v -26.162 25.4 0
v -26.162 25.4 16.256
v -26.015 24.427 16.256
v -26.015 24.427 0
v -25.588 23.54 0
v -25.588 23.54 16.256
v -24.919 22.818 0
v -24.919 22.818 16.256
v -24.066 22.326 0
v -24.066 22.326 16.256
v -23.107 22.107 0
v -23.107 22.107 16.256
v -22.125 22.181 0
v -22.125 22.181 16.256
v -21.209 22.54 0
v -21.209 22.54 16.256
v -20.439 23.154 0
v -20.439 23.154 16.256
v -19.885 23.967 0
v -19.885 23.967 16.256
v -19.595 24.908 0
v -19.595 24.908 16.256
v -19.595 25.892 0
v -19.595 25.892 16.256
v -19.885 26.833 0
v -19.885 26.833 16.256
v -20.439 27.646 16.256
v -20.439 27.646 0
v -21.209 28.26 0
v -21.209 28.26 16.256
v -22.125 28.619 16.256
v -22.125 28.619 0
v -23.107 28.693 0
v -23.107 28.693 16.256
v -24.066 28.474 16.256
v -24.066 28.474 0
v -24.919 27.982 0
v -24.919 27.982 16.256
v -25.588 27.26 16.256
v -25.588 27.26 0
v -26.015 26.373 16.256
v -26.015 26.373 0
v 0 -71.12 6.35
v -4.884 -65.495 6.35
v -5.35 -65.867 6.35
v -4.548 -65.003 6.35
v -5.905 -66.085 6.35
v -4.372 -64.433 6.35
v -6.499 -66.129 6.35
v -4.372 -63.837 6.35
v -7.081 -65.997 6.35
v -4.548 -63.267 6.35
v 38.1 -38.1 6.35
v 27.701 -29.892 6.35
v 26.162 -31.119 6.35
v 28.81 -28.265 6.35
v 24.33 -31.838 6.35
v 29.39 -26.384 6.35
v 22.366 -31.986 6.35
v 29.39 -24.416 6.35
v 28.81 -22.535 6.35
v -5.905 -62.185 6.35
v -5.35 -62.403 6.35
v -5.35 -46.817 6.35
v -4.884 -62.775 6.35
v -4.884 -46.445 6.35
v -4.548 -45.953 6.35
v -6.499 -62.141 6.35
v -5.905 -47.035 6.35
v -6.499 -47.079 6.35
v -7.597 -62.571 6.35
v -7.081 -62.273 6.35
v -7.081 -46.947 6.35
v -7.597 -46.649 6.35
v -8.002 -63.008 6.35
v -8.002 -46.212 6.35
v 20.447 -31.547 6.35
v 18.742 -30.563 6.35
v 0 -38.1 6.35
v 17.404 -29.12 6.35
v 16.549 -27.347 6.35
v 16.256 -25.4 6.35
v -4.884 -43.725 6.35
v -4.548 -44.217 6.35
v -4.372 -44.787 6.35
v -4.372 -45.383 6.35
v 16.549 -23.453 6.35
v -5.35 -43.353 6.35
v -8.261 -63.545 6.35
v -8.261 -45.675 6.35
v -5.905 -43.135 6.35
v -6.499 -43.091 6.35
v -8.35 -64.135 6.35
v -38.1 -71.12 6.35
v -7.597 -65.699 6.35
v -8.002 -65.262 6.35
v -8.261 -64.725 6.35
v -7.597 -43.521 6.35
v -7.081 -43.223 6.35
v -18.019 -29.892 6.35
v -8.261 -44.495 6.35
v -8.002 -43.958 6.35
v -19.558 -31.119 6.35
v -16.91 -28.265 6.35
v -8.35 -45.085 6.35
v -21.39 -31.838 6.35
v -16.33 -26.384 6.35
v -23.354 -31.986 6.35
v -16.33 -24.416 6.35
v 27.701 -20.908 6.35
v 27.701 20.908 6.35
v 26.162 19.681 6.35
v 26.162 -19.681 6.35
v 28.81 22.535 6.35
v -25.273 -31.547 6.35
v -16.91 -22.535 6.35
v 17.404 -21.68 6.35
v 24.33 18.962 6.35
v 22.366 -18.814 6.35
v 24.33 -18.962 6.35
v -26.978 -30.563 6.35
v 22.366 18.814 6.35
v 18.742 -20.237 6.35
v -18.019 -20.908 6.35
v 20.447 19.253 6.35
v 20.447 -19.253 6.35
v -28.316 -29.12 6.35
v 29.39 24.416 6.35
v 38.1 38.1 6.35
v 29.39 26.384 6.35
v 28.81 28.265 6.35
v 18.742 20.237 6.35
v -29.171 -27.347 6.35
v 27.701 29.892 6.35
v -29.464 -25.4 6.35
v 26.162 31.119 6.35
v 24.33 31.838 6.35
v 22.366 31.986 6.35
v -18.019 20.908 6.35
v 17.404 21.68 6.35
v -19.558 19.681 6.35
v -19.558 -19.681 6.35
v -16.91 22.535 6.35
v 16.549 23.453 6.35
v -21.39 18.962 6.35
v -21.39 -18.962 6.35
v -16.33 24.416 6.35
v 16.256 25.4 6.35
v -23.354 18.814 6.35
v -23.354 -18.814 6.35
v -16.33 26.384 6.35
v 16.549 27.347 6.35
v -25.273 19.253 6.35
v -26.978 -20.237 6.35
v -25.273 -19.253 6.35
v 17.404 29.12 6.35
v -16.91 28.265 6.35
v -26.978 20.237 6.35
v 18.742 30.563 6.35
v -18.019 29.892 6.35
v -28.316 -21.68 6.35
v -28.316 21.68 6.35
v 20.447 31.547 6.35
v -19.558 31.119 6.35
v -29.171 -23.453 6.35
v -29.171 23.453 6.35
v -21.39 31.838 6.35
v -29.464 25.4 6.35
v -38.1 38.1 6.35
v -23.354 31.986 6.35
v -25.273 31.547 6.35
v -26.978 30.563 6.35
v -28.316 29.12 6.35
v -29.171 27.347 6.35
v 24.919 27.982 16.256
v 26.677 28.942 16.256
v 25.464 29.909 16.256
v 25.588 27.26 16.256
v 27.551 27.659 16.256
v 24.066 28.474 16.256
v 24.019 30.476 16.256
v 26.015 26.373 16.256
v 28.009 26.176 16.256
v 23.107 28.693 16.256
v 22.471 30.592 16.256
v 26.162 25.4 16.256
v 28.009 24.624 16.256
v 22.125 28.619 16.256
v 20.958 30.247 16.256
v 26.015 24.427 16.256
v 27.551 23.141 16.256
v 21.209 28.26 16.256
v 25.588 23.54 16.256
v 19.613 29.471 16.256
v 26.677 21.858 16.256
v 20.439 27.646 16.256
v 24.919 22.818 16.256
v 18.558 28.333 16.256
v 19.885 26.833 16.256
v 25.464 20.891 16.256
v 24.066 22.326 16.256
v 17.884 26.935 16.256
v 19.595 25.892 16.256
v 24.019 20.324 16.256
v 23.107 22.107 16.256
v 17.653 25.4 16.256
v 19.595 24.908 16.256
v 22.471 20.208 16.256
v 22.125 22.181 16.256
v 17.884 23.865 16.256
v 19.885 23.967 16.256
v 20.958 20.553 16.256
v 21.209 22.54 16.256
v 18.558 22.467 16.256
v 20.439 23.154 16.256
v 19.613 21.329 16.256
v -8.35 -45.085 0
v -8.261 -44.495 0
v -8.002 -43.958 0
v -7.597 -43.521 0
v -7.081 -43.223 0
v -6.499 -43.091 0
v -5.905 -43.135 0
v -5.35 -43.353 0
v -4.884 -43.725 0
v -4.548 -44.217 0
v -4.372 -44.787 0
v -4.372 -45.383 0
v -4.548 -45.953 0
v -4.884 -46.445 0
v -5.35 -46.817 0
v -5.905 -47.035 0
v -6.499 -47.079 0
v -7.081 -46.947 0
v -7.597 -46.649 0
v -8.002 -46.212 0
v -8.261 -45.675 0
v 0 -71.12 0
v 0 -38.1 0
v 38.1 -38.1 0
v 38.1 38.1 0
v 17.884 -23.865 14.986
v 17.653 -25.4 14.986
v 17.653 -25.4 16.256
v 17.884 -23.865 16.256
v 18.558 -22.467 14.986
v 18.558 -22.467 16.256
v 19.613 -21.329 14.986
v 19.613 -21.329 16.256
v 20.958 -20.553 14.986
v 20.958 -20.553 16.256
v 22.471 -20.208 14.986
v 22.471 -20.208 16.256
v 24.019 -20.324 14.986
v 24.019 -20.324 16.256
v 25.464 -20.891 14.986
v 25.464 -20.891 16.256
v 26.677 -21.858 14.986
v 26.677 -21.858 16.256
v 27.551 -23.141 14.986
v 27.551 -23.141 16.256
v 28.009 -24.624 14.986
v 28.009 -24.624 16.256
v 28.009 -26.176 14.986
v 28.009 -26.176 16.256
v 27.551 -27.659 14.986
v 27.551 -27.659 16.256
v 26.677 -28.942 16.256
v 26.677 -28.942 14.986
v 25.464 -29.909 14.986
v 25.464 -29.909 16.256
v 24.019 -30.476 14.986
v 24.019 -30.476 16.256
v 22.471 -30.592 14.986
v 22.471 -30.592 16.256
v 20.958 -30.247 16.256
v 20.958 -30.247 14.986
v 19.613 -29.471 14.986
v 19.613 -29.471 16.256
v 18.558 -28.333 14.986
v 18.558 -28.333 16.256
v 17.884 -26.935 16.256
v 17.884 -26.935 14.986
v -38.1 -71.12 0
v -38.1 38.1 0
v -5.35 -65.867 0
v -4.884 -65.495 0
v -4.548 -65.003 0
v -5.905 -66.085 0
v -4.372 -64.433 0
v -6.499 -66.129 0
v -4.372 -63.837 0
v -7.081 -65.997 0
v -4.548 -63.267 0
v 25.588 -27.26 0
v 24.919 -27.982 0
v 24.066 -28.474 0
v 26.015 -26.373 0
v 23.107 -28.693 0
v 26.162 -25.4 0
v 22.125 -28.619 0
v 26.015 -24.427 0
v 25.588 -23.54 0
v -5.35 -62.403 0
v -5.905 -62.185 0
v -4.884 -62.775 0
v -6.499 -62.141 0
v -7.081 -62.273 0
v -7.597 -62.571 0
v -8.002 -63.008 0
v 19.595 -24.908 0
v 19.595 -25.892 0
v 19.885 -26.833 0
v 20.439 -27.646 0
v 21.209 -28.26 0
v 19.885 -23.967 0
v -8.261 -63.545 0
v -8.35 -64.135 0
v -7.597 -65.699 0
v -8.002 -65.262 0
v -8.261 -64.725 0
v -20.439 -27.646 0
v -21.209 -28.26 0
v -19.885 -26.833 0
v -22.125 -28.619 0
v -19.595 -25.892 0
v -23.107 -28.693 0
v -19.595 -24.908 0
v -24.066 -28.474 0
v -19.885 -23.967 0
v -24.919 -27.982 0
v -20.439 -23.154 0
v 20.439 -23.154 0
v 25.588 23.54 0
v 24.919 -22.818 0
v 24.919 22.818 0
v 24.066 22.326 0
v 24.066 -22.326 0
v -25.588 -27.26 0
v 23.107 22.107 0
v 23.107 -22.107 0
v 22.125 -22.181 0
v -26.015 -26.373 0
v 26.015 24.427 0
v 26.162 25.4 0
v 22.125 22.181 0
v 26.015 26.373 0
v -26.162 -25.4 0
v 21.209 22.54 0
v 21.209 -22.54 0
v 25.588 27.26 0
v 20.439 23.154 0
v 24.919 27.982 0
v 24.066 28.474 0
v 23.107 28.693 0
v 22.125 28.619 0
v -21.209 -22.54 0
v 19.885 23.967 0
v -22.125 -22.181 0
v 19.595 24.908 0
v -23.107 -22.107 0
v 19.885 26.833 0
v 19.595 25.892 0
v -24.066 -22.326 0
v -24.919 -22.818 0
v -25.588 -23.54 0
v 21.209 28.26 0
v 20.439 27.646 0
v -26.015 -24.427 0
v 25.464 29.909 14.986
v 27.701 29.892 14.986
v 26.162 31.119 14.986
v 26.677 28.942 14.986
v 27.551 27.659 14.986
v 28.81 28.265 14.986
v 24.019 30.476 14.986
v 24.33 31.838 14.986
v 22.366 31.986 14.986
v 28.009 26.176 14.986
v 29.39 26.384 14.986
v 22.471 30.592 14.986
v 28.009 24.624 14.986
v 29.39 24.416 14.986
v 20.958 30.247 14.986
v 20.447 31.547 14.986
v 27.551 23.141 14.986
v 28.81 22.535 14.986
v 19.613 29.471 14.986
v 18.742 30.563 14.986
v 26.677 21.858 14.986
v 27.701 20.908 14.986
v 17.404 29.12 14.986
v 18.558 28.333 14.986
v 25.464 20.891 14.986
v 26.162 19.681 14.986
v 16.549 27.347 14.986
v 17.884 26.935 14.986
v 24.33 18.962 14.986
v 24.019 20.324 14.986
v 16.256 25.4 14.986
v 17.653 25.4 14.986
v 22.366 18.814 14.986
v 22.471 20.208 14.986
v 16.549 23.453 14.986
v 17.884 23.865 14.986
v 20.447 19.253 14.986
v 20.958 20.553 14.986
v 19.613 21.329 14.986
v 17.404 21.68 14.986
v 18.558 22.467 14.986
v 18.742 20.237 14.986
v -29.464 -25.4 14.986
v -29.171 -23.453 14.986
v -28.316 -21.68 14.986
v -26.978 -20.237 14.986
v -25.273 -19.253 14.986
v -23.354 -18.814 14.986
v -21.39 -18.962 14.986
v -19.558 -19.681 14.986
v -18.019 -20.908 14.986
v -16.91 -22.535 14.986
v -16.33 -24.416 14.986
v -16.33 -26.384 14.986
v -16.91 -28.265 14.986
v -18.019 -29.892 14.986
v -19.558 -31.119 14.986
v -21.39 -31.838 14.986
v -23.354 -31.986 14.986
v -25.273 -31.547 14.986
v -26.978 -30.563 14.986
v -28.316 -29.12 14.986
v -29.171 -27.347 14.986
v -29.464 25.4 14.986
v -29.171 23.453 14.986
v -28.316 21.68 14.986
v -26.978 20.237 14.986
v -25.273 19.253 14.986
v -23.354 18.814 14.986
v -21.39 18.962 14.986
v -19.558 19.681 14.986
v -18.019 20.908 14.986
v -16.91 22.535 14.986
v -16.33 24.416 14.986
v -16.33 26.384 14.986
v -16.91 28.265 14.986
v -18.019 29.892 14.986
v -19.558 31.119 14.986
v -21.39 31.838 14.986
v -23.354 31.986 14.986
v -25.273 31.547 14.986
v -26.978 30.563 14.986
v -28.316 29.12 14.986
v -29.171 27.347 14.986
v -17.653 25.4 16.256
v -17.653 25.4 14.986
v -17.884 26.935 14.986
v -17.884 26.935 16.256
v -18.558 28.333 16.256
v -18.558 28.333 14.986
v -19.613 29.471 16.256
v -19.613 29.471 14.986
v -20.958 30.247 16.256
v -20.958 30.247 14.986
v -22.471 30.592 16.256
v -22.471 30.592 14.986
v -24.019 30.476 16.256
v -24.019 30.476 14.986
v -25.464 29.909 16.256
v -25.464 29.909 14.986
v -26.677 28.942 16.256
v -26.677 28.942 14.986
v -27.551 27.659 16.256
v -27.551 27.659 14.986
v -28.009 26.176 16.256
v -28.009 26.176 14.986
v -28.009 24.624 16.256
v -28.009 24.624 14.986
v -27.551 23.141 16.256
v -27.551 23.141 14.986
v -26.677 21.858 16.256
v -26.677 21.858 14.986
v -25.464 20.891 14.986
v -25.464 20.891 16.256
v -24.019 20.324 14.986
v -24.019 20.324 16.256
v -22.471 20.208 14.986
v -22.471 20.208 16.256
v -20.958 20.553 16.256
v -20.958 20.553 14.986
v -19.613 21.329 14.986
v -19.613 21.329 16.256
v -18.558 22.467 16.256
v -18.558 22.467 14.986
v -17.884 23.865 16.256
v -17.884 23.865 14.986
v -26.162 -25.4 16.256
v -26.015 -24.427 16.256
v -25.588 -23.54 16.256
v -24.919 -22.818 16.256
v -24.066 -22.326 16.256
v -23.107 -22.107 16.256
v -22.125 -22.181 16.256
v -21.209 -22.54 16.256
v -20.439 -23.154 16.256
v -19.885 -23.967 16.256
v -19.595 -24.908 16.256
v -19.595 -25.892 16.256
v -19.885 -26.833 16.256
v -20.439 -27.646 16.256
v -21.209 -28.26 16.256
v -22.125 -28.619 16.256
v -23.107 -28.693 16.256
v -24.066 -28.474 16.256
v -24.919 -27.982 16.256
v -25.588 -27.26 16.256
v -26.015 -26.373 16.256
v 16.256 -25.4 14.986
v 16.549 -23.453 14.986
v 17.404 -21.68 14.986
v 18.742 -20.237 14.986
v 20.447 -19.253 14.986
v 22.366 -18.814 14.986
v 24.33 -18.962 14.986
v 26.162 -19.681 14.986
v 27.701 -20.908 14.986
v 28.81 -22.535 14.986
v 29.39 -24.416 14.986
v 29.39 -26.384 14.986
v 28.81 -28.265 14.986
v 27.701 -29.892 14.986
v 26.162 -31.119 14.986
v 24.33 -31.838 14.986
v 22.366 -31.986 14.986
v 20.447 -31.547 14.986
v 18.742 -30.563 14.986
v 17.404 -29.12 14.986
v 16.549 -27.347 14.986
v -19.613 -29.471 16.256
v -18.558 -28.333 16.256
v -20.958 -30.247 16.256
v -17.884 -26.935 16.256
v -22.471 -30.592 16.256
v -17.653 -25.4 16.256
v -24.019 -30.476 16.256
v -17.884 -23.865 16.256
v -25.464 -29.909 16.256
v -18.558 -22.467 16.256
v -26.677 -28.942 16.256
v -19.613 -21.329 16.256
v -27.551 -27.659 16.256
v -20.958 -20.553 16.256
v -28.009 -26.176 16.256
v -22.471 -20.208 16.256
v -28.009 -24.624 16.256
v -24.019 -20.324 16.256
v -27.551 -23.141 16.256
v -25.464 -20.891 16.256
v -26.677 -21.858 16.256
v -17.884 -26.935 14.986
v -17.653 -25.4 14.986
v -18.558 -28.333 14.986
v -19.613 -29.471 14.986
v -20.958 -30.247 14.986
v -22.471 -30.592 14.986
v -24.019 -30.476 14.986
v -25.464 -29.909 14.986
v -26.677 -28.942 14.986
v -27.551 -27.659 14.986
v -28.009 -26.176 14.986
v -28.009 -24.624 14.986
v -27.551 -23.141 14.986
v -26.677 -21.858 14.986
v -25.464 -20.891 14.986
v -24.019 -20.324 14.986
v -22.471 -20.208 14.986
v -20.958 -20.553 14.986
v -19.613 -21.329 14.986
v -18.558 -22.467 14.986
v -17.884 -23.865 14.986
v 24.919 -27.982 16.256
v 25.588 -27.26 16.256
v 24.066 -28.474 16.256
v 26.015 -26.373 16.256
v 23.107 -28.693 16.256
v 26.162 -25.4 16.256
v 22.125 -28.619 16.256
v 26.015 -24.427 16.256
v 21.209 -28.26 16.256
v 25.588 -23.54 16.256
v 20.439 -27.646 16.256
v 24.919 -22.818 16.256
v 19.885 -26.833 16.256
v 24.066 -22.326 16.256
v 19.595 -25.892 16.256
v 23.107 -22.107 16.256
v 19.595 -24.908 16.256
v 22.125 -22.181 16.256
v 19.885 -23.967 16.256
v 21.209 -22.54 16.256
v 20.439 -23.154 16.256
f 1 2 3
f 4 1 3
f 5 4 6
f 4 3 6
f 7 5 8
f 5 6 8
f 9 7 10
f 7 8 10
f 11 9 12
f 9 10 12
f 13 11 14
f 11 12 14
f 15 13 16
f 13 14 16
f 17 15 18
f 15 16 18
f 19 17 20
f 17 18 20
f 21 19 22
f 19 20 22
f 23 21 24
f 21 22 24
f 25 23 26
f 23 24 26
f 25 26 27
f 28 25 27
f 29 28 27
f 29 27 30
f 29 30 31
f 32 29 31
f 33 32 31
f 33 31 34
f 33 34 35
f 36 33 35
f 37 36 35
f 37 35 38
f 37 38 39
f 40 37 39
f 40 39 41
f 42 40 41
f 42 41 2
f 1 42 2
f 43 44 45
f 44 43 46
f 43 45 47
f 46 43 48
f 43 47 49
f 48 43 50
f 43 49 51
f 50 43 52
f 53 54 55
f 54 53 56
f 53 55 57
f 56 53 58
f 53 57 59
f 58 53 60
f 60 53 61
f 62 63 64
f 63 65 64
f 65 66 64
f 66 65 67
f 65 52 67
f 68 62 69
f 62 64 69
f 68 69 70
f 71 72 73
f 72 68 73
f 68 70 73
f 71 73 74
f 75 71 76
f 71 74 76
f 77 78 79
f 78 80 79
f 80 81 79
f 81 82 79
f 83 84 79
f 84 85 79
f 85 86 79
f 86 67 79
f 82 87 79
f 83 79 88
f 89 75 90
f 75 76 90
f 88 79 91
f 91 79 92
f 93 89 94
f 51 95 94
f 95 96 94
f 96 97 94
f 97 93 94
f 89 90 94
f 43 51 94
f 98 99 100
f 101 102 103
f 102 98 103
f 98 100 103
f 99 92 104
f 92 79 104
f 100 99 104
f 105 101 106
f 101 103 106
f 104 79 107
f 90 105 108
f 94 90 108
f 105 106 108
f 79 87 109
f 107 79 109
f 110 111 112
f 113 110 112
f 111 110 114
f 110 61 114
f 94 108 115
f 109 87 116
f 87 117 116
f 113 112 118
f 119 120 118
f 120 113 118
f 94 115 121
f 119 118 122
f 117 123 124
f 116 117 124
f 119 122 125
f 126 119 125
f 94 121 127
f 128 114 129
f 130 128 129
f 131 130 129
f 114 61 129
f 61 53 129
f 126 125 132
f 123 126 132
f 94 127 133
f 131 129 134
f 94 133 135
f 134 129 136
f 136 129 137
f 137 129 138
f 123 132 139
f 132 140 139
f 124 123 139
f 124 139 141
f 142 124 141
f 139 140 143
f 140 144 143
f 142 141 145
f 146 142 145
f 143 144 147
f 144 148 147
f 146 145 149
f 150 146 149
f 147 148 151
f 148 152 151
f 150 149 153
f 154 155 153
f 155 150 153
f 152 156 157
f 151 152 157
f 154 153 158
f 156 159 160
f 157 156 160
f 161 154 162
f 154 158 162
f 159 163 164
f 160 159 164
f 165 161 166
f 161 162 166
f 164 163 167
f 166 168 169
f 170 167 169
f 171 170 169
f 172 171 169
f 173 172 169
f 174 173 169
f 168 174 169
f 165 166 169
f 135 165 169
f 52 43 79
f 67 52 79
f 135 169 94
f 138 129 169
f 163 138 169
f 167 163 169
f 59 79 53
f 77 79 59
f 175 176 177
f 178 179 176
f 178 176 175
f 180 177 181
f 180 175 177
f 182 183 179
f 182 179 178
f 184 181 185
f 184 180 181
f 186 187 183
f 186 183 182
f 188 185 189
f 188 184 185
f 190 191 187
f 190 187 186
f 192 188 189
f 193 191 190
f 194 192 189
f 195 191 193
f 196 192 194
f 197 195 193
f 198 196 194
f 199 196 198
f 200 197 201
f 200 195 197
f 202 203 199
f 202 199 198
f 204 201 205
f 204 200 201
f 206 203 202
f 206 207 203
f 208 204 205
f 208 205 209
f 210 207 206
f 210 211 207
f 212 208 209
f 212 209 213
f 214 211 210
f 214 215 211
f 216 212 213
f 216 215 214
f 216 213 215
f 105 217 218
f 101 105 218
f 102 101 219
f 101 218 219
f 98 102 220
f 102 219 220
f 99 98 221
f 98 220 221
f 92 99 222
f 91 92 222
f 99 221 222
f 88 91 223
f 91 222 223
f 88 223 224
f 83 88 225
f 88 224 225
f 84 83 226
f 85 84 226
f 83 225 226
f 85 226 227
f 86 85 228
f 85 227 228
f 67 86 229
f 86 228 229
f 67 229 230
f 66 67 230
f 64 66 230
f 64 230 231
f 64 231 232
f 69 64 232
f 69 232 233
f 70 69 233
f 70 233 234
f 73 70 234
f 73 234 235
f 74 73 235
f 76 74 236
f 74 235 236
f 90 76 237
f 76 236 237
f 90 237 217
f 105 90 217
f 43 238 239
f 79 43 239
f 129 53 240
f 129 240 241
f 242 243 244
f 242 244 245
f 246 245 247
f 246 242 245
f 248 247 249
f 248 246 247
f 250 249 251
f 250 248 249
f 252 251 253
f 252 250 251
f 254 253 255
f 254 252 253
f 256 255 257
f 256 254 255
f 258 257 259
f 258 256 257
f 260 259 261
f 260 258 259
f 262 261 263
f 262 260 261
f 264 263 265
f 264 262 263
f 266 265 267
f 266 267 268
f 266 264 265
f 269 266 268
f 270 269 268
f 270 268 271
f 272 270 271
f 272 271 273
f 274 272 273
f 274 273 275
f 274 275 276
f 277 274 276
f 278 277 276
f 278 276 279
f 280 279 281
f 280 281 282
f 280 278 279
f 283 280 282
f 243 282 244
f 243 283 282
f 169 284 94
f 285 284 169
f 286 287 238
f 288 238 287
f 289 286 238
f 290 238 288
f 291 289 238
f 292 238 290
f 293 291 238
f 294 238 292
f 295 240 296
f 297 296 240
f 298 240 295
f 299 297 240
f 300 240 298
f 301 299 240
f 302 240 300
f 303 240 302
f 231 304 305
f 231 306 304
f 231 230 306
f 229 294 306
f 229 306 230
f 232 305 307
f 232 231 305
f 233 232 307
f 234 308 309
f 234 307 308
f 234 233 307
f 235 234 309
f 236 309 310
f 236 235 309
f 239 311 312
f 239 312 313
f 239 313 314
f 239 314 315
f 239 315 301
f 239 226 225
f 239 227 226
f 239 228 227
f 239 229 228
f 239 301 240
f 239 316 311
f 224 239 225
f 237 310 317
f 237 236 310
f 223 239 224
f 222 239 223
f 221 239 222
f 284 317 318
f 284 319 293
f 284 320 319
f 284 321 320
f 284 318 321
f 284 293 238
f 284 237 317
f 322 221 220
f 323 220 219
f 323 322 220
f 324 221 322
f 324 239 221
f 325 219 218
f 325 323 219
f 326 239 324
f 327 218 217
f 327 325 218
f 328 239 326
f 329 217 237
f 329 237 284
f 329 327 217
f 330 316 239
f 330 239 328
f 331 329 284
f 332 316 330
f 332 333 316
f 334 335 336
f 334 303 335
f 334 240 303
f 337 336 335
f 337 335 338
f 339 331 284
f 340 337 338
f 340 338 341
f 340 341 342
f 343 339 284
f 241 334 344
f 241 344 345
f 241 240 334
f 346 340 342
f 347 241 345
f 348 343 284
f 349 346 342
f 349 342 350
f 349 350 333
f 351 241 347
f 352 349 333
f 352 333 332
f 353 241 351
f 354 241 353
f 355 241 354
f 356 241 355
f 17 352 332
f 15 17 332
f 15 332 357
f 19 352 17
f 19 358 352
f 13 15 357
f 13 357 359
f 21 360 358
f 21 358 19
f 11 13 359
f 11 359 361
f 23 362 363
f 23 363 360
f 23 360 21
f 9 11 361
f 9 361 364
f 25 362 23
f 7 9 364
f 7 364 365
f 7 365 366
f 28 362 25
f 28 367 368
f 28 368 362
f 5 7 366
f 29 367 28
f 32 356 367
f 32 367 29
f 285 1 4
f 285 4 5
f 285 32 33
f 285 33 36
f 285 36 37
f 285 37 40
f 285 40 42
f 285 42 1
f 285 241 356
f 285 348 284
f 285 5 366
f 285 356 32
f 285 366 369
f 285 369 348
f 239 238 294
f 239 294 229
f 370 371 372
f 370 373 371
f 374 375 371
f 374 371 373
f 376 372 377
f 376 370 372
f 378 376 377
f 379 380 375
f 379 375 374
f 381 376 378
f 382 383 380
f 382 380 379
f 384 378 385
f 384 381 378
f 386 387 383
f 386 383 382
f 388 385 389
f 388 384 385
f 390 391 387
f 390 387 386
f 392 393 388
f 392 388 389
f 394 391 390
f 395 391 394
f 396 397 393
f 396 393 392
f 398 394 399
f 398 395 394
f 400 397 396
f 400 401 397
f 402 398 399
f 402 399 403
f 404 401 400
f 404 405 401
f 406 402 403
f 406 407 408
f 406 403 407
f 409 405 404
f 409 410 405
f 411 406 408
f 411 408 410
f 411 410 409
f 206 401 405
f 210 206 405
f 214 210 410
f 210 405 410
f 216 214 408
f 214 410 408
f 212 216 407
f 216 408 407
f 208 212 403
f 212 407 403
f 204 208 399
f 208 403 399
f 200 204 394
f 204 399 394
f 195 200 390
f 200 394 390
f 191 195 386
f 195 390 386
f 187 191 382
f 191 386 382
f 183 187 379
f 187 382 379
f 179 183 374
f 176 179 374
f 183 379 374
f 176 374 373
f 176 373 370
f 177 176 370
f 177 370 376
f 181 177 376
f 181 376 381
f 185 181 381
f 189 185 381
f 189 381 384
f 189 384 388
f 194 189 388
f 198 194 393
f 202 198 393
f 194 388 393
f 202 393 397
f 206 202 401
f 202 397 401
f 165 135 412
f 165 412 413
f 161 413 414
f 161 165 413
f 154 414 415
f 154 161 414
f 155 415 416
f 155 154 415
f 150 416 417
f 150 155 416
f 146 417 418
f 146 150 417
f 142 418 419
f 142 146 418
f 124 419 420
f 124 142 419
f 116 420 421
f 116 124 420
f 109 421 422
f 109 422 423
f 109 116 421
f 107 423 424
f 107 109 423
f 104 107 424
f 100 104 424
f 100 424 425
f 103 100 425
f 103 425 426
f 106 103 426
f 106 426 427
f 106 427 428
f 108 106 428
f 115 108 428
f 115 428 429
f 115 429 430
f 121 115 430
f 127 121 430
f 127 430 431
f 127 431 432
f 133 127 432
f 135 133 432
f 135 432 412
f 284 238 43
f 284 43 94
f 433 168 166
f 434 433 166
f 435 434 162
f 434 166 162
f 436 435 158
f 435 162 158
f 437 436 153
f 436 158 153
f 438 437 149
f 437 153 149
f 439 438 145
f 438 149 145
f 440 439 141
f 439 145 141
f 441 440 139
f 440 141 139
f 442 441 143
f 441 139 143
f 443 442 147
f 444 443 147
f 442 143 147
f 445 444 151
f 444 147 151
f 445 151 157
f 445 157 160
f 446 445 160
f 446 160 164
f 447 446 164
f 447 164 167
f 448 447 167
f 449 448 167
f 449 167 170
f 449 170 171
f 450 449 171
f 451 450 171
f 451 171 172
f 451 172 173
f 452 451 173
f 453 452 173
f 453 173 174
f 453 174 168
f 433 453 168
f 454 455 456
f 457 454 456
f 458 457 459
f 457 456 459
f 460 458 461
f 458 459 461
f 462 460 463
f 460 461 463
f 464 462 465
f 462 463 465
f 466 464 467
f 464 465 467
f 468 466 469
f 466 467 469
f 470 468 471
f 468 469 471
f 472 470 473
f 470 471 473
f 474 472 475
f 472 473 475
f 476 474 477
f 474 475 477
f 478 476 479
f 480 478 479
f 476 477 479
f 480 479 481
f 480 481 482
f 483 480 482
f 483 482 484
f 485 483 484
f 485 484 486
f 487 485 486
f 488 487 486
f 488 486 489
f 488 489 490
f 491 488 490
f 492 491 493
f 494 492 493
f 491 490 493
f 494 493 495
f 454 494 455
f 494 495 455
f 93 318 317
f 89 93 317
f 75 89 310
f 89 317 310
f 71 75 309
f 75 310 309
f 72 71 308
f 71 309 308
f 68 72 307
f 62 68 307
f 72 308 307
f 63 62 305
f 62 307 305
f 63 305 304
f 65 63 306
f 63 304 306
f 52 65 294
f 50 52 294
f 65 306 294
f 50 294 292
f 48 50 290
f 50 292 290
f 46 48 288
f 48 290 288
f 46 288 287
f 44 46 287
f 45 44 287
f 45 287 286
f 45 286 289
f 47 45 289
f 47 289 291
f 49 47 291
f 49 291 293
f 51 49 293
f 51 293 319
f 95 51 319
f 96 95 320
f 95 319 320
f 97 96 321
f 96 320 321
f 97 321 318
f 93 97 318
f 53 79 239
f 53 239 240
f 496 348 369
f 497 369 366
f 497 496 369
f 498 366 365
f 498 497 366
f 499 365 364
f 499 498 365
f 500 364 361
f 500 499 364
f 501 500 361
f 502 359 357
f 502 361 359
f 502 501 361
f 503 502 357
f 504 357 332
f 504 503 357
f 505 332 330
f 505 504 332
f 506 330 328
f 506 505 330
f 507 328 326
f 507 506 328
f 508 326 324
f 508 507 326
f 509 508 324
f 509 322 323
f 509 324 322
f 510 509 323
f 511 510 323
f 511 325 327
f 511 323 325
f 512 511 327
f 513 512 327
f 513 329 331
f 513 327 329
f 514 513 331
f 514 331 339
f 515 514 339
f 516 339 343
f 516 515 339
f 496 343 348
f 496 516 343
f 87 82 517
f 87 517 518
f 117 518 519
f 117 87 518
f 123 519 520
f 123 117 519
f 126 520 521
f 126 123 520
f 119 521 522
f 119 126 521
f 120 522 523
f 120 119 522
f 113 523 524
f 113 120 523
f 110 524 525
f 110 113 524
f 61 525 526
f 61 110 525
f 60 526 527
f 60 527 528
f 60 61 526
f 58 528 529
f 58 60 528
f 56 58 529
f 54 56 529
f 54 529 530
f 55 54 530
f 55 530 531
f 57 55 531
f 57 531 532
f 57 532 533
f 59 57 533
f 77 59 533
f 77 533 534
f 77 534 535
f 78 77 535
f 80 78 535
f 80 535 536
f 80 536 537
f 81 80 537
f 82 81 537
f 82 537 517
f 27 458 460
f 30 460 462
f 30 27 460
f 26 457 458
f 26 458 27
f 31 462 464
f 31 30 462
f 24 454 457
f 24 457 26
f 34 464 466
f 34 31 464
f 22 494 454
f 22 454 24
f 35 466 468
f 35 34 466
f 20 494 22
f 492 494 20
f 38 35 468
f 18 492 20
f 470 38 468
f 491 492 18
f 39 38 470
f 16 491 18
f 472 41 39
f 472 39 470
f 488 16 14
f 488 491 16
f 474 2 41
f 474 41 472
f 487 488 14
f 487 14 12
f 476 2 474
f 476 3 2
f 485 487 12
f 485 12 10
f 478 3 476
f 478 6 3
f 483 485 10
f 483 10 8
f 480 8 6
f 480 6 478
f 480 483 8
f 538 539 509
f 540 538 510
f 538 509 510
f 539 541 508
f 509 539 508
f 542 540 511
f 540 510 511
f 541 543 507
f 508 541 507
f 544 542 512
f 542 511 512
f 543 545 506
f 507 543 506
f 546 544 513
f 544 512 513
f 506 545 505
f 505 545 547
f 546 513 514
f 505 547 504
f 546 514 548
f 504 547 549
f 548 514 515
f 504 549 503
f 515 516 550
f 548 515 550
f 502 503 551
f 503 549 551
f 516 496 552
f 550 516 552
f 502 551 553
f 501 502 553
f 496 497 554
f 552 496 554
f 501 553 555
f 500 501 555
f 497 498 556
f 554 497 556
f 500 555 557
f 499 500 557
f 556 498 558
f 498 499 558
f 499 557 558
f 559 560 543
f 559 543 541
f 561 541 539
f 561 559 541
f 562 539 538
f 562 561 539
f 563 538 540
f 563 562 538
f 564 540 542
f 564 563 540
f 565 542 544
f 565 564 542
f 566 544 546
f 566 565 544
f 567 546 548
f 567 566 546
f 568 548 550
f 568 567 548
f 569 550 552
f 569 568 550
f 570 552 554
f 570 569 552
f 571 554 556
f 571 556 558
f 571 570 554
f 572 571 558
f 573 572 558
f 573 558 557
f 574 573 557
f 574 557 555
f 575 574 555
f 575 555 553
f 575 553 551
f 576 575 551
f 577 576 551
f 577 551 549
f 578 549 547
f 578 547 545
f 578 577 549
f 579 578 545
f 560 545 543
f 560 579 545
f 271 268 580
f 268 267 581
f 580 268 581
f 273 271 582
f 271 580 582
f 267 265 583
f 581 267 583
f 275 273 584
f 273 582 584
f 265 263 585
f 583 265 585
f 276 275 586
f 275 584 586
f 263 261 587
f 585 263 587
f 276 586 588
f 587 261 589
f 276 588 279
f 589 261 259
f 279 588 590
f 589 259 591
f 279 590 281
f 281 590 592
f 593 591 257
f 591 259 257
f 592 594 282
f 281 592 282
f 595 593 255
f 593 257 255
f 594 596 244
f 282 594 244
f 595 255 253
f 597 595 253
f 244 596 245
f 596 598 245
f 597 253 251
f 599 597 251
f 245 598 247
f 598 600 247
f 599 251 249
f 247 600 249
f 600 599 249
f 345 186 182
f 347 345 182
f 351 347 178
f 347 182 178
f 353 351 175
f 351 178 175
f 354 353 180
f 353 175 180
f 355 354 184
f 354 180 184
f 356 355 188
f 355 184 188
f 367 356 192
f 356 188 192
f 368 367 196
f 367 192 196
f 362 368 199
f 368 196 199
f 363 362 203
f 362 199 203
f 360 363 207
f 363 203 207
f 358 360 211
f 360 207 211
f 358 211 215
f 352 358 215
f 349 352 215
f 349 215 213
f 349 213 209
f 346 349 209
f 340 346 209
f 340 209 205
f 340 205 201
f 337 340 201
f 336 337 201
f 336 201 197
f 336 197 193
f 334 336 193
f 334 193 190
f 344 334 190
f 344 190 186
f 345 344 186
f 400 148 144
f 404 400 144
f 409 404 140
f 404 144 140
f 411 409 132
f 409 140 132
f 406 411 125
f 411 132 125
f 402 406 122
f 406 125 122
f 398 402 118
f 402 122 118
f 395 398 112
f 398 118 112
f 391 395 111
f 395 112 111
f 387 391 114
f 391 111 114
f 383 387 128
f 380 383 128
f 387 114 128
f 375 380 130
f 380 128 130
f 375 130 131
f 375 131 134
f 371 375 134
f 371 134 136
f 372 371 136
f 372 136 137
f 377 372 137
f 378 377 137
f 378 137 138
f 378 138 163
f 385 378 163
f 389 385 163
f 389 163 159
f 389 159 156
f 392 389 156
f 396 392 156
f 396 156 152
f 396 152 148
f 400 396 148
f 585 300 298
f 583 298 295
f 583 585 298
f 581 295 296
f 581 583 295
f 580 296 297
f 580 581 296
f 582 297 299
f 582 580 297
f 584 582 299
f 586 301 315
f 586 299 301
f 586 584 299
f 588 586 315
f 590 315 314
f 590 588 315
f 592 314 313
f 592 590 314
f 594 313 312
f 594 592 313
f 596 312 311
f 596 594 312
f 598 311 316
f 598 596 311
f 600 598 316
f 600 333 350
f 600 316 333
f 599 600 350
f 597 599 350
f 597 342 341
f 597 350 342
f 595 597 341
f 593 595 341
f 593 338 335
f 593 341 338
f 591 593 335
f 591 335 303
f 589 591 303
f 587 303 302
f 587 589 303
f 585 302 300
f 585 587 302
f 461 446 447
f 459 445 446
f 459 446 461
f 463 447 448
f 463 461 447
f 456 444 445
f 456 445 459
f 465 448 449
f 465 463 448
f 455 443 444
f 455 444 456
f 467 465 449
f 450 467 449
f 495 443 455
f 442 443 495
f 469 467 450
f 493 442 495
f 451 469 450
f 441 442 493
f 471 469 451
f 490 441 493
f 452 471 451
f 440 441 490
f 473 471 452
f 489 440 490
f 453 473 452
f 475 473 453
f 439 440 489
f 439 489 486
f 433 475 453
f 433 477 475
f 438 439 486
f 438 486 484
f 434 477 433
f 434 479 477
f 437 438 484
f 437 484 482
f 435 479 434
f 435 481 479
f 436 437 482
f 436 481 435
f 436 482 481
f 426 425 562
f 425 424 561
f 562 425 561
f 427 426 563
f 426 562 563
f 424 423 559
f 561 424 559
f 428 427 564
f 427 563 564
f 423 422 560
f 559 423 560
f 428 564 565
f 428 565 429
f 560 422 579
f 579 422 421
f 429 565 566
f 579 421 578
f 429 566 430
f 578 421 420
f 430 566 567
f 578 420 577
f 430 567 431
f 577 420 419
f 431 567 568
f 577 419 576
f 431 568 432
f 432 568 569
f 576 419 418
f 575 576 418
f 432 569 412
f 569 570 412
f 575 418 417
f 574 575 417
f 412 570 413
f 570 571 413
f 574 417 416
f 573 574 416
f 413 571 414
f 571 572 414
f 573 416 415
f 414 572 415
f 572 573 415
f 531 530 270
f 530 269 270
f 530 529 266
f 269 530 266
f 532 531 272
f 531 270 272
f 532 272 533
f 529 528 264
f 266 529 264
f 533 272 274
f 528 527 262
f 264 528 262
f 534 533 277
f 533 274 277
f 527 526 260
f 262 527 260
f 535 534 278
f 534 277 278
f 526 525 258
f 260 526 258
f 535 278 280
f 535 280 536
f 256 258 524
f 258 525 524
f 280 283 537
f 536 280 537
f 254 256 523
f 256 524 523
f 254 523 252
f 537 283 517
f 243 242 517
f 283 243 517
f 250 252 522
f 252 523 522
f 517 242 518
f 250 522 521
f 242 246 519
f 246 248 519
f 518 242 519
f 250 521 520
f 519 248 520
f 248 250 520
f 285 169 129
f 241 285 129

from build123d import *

# Parameters (mm, degrees)
SKETCH1_W           = 38.1
SKETCH1_H           = 76.2
BOSS_EXTRUDE1_DEPTH = 6.35
SKETCH8_W           = 19.05
SKETCH8_H           = 76.2
BOSS_EXTRUDE5_DEPTH = 6.35
SKETCH5_R           = 6.604
BOSS_EXTRUDE2_DEPTH = 9.906
SKETCH6_R           = 3.302
CUT_EXTRUDE3_DEPTH  = 57.280347689
CUT_EXTRUDE4_START  = -1.27
SKETCH9_R           = 6.604
SKETCH9_R_2         = 5.207
CUT_EXTRUDE4_DEPTH  = 1.27
SKETCH11_W          = 38.1
SKETCH11_H          = 33.02
SKETCH11_R          = 2
BOSS_EXTRUDE6_DEPTH = 6.35


with BuildPart() as part:
    # Sketch1 → Boss-Extrude1 (new body)
    with BuildSketch(Plane.XY):
        Rectangle(SKETCH1_W, SKETCH1_H)
    extrude(amount=BOSS_EXTRUDE1_DEPTH)

    # Sketch8 → Boss-Extrude5 (add)
    with BuildSketch(Plane.XY.offset(6.35)):
        with Locations((-28.575, 0)):
            Rectangle(SKETCH8_W, SKETCH8_H)
        with Locations((28.575, 0)):
            Rectangle(SKETCH8_W, SKETCH8_H)
    extrude(amount=-BOSS_EXTRUDE5_DEPTH)

    # Sketch5 → Boss-Extrude2 (add)
    with BuildSketch(Plane.XY.offset(6.35)):
        with Locations(Location((22.86, 25.4, 0), (0, 0, 180))):
            Circle(SKETCH5_R)
        with Locations(Location((-22.86, 25.4, 0), (0, 0, 180))):
            Circle(SKETCH5_R)
    boss_extrude2 = extrude(amount=BOSS_EXTRUDE2_DEPTH)

    # Sketch6 → Cut-Extrude3 (cut, through all)
    with BuildSketch(Plane.XY.offset(16.256)):
        with Locations((22.86, 25.4)):
            Circle(SKETCH6_R)
        with Locations(Location((-22.86, 25.4, 0), (0, 0, 180))):
            Circle(SKETCH6_R)
    cut_extrude3 = extrude(amount=-CUT_EXTRUDE3_DEPTH, mode=Mode.SUBTRACT)

    # Sketch9 → Cut-Extrude4 (cut)
    # profile 1 of 2: a face of its own
    with BuildSketch(Plane.XY.offset(16.256).offset(CUT_EXTRUDE4_START)):
        with Locations(Location((-22.86, 25.4, 0), (0, 0, 180))):
            Circle(SKETCH9_R)
        with Locations((-22.86, 25.4)):
            Circle(SKETCH9_R_2, mode=Mode.SUBTRACT)
    # profile 2 of 2: a face of its own
    with BuildSketch(Plane.XY.offset(16.256).offset(CUT_EXTRUDE4_START)):
        with Locations(Location((22.86, 25.4, 0), (0, 0, 180))):
            Circle(SKETCH9_R)
        with Locations(Location((22.86, 25.4, 0), (0, 0, 180))):
            Circle(SKETCH9_R_2, mode=Mode.SUBTRACT)
    cut_extrude4 = extrude(amount=CUT_EXTRUDE4_DEPTH, mode=Mode.SUBTRACT)

    # Mirror1: Boss-Extrude2, Cut-Extrude3, Cut-Extrude4 across plane
    add(boss_extrude2.mirror(Plane.ZX))
    add(cut_extrude3.mirror(Plane.ZX), mode=Mode.SUBTRACT)
    add(cut_extrude4.mirror(Plane.ZX), mode=Mode.SUBTRACT)

    # Sketch11 → Boss-Extrude6 (add)
    with BuildSketch(Plane(origin=(0, 0, 0), x_dir=(-1, 0, 0), z_dir=(0, 0, -1))):
        with Locations((19.05, -54.61)):
            Rectangle(SKETCH11_W, SKETCH11_H)
        with Locations((6.35, -64.135)):
            Circle(SKETCH11_R, mode=Mode.SUBTRACT)
        with Locations((6.35, -45.085)):
            Circle(SKETCH11_R, mode=Mode.SUBTRACT)
    extrude(amount=-BOSS_EXTRUDE6_DEPTH)


solid = part.part
